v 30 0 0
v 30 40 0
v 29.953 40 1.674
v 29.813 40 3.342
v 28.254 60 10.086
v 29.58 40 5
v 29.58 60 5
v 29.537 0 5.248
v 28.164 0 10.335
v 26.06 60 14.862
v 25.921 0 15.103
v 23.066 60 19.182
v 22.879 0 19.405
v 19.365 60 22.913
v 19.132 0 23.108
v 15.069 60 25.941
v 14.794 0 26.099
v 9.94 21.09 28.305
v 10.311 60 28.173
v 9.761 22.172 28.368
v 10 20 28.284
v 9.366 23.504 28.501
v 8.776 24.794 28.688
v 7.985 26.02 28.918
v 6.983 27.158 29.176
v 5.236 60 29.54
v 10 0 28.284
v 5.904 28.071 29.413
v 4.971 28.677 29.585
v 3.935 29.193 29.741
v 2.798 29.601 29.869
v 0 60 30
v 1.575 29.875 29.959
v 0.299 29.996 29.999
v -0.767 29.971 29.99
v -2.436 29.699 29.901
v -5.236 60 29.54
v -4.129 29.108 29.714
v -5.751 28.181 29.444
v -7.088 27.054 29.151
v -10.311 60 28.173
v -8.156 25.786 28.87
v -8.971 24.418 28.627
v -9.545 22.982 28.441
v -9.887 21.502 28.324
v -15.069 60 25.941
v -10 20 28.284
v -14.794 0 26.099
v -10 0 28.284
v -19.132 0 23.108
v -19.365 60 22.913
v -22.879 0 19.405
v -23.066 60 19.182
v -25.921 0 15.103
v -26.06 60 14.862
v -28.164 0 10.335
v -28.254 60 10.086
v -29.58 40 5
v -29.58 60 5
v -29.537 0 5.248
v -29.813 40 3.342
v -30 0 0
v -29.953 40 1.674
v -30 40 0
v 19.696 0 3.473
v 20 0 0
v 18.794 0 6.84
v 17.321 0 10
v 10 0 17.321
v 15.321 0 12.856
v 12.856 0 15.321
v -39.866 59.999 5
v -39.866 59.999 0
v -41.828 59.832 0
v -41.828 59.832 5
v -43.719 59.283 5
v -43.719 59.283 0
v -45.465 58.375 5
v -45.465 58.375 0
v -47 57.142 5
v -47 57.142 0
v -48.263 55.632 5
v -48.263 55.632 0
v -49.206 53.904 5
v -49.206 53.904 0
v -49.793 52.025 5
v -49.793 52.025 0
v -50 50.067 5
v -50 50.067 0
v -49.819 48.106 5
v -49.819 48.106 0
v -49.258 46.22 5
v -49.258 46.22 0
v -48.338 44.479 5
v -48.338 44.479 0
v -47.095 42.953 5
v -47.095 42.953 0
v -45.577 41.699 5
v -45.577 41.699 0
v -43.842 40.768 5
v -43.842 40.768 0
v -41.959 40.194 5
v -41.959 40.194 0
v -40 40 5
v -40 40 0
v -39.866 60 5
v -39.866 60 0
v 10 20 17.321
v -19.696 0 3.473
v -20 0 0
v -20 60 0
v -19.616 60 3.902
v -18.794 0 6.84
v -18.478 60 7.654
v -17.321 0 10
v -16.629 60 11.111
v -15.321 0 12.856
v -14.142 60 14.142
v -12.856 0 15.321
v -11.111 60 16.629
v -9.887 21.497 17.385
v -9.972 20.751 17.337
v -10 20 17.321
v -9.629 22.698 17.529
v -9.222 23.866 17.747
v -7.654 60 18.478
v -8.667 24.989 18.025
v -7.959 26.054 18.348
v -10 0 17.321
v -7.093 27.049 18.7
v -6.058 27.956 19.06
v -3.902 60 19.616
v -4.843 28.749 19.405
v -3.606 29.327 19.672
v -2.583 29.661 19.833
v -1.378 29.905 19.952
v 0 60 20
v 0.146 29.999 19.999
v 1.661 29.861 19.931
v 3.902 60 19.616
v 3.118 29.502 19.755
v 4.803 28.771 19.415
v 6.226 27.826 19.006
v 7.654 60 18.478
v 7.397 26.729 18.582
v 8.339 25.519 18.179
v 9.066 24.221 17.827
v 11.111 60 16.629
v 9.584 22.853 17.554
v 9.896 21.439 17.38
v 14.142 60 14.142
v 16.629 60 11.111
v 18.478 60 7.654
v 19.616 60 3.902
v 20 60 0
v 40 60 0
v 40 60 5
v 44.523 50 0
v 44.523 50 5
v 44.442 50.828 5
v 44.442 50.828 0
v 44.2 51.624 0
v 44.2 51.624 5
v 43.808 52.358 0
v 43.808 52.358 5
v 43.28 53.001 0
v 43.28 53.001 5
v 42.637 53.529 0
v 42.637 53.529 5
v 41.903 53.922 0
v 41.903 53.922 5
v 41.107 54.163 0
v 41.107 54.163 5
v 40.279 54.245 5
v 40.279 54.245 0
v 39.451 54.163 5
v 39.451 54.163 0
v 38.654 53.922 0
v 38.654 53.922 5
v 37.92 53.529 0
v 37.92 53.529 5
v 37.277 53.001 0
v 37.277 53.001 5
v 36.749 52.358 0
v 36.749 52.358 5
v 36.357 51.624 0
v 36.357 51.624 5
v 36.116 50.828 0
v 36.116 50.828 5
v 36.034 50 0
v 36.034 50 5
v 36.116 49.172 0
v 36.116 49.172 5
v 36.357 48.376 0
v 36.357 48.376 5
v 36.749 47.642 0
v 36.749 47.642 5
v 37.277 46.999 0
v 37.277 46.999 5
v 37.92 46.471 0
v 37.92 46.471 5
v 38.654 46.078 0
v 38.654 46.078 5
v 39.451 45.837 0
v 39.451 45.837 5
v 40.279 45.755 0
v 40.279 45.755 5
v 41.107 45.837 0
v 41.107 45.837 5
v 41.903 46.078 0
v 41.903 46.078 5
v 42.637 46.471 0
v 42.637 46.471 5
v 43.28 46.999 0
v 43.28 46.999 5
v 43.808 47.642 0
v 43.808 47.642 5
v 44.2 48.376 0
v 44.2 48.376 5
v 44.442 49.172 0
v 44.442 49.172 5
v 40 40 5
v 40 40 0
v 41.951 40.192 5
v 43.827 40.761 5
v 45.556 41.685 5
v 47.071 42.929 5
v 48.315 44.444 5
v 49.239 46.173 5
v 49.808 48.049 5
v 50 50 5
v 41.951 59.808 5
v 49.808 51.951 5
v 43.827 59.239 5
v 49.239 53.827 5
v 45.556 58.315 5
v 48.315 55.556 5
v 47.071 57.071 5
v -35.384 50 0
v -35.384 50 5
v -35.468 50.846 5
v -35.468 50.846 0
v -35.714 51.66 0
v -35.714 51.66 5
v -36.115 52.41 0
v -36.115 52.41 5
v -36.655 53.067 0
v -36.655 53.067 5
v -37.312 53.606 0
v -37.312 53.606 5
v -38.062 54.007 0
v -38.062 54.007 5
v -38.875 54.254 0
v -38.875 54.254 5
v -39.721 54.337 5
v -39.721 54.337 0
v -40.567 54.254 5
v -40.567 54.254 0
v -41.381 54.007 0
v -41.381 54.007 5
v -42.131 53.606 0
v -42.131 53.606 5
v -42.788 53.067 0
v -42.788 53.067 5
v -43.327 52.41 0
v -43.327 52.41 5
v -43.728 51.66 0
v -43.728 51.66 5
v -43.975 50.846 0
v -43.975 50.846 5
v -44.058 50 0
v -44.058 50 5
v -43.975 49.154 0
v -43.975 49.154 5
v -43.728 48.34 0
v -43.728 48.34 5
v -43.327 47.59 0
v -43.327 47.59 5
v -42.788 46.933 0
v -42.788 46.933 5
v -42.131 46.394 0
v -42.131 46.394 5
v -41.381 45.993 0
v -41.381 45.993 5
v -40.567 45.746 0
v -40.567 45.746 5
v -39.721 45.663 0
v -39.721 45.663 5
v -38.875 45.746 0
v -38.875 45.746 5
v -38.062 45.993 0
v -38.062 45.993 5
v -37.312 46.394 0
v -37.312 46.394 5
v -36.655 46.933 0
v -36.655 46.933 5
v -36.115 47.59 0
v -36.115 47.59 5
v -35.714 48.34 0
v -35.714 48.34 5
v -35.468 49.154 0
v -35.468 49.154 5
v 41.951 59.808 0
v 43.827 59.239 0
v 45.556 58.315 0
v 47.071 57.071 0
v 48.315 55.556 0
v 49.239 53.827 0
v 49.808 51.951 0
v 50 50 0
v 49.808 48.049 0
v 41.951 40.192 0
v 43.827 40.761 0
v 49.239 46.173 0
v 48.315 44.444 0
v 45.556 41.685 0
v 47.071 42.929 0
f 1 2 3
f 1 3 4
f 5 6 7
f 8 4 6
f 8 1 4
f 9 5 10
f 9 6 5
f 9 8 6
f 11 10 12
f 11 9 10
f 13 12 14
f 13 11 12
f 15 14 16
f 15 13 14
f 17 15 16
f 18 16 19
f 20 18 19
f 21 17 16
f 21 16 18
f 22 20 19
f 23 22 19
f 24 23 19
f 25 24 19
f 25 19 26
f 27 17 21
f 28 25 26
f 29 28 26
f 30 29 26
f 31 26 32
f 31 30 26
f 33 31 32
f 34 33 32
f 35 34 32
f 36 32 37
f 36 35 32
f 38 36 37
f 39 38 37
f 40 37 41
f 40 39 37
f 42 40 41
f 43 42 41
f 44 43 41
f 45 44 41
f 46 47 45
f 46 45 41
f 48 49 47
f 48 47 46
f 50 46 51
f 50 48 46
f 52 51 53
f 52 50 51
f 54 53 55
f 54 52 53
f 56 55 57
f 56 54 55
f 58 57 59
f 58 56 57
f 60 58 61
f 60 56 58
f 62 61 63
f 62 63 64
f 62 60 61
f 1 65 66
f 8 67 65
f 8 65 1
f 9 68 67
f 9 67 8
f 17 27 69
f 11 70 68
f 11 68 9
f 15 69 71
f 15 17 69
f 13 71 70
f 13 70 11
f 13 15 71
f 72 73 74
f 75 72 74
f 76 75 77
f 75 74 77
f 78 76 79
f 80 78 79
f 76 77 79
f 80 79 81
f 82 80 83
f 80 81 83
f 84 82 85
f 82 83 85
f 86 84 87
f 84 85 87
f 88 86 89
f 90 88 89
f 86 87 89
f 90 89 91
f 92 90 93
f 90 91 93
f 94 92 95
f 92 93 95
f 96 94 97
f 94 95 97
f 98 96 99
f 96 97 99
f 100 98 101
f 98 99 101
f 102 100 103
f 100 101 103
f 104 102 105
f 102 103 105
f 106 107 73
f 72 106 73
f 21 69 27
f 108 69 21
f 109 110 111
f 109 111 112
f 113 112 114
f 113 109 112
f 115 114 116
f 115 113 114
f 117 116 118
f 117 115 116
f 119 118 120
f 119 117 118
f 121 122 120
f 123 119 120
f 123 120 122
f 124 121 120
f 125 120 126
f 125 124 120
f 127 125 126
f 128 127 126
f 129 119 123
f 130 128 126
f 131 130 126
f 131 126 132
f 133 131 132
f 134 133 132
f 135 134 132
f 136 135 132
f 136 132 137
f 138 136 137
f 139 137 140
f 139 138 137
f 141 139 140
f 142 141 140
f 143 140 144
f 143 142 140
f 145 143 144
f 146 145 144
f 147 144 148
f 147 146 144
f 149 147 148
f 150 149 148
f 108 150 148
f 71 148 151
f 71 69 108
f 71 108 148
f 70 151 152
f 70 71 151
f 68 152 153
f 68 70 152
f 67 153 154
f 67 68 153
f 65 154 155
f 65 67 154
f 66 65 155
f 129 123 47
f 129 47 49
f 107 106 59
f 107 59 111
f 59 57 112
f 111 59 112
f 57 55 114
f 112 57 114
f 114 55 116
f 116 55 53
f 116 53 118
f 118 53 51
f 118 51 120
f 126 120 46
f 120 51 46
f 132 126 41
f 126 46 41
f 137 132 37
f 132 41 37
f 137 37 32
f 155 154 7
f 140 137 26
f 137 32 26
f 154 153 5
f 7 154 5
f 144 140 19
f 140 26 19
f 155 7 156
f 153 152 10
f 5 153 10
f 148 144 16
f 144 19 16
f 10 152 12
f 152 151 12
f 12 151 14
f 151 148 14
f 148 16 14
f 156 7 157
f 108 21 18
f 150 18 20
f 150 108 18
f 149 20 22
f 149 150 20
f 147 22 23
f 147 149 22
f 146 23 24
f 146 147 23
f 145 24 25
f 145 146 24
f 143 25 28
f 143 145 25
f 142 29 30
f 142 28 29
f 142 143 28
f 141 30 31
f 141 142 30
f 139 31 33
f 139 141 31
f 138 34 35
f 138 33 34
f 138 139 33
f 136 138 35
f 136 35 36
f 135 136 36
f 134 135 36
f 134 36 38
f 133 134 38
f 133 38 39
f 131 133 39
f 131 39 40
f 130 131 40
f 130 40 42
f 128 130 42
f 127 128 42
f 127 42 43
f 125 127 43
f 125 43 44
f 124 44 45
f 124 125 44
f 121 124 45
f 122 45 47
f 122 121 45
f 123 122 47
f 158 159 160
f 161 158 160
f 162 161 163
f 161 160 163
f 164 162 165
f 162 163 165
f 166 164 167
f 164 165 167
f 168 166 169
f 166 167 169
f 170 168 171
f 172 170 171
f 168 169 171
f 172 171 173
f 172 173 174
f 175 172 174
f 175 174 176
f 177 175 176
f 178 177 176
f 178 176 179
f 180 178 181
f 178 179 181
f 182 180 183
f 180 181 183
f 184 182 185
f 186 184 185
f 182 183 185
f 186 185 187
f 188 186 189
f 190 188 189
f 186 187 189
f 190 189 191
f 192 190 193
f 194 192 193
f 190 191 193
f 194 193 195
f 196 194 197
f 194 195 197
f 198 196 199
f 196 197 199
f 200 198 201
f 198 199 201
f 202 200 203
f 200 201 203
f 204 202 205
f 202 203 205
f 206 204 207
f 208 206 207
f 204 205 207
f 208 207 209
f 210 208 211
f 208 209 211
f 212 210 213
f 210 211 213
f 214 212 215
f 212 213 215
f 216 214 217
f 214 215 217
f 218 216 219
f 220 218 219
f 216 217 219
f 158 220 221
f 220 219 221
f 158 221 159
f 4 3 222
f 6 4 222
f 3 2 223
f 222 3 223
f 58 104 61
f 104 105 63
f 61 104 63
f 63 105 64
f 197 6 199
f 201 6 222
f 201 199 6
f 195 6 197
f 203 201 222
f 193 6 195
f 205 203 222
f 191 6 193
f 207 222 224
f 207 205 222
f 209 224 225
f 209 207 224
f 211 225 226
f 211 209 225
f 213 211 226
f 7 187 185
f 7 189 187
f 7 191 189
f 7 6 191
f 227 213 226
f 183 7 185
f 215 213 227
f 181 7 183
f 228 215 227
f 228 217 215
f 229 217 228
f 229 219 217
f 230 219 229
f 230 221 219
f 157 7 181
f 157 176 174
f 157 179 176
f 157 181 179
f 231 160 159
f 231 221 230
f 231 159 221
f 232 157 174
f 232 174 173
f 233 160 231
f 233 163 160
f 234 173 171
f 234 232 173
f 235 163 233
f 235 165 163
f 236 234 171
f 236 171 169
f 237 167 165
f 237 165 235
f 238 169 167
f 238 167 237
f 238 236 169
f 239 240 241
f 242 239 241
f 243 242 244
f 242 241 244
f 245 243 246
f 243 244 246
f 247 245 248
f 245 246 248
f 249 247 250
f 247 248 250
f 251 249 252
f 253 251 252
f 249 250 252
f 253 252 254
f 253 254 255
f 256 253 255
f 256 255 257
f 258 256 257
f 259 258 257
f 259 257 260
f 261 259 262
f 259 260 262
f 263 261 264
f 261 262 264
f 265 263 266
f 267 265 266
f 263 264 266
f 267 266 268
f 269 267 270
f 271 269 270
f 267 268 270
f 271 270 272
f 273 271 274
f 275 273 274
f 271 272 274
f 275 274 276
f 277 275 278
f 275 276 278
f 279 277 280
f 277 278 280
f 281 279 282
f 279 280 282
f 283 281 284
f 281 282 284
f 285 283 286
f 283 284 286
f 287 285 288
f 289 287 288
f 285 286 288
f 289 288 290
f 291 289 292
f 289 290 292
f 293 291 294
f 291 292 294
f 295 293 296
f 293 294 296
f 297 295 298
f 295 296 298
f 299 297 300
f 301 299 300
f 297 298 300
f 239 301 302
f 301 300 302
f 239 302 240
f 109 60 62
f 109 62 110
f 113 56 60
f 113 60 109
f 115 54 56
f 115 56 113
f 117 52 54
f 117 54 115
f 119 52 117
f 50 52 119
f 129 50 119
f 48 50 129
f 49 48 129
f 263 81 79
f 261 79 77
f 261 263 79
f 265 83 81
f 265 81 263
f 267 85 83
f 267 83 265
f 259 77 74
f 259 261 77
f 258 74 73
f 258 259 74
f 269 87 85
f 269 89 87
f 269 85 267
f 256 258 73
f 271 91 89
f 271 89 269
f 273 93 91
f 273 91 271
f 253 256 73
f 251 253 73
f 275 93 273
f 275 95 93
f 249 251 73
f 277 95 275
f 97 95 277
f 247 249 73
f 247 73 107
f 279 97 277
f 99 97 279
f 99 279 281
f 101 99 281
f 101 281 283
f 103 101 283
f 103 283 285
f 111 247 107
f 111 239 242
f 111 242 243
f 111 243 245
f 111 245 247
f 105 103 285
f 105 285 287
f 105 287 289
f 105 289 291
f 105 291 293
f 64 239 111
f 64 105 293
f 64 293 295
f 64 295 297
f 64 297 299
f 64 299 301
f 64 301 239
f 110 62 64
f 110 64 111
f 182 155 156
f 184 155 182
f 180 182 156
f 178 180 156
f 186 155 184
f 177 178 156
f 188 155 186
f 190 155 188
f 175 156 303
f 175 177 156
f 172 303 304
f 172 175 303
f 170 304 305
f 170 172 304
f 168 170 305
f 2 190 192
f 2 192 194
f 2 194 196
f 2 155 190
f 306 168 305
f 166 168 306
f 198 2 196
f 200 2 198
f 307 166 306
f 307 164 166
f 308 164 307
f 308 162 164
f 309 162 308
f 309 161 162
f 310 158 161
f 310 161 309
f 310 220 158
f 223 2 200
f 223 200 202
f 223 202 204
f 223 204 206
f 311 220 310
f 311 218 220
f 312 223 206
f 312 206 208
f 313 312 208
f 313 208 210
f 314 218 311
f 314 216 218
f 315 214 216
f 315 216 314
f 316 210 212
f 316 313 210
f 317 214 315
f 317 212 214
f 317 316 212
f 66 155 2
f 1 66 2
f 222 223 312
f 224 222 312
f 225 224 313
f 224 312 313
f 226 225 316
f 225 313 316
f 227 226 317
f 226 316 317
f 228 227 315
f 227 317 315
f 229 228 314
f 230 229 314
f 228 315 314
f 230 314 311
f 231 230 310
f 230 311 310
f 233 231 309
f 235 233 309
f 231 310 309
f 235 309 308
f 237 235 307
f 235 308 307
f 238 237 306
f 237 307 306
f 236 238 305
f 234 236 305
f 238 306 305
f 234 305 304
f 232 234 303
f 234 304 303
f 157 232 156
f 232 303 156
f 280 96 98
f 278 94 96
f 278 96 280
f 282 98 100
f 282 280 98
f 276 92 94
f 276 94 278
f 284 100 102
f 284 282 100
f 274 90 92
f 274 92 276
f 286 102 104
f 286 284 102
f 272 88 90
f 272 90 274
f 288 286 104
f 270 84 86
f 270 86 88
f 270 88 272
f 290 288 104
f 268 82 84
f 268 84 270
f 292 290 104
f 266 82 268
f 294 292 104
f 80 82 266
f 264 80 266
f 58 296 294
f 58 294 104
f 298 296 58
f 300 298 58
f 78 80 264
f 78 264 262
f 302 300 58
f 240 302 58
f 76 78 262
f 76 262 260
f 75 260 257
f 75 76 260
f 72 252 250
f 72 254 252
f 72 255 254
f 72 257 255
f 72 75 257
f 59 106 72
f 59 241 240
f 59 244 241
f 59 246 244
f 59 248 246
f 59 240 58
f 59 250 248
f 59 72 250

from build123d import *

# Parameters (mm, degrees)
F1_DEPTH = 60
F3_DEPTH = 5
F4_R     = 4.244669
F4_R_2   = 4.337045
F5_DEPTH = 5
F7_DEPTH = 30


with BuildPart() as f1:
    # F0 (on Front) → F1 (new body)
    with BuildSketch(Plane.XZ):
        with BuildLine():
            Line((20, 0), (30, 0))
            ThreePointArc((30, 0), (0, 30), (-30, 0))
            Line((-30, 0), (-20, 0))
            ThreePointArc((-20, 0), (0, 20), (20, 0))
        make_face()
    extrude(amount=-F1_DEPTH)

    # F2 (on Top) → F3 (join)
    with BuildSketch(Plane.XY):
        with BuildLine():
            Line((26, 40), (40, 40))
            ThreePointArc((40, 40), (50, 50), (40, 60))
            Line((40, 60), (26, 60))
            Line((26, 60), (26, 40))
        make_face()
        with BuildLine():
            Line((-39.86631, 60), (-39.866316, 59.999106))
            ThreePointArc((-39.866316, 59.999106), (-49.999777, 50.066844), (-40, 40))
            Line((-40, 40), (-26, 40))
            Line((-26, 40), (-26, 60))
            Line((-26, 60), (-39.86631, 60))
        make_face()
    extrude(amount=F3_DEPTH)

    # F4 (on face) → F5 (cut)
    with BuildSketch(Plane.XY.offset(5)):
        with Locations((40.278634, 50)):
            Circle(F4_R)
        with Locations((-39.721366, 50)):
            Circle(F4_R_2)
    extrude(amount=-F5_DEPTH, mode=Mode.SUBTRACT)

    # F6 (on Top) → F7 (cut)
    with BuildSketch(Plane.XY):
        with BuildLine():
            Line((10, 0), (10, 20))
            ThreePointArc((10, 20), (0, 30), (-10, 20))
            Line((-10, 20), (-10, 0))
            Line((-10, 0), (10, 0))
        make_face()
    extrude(amount=F7_DEPTH, mode=Mode.SUBTRACT)


solid = f1.part
